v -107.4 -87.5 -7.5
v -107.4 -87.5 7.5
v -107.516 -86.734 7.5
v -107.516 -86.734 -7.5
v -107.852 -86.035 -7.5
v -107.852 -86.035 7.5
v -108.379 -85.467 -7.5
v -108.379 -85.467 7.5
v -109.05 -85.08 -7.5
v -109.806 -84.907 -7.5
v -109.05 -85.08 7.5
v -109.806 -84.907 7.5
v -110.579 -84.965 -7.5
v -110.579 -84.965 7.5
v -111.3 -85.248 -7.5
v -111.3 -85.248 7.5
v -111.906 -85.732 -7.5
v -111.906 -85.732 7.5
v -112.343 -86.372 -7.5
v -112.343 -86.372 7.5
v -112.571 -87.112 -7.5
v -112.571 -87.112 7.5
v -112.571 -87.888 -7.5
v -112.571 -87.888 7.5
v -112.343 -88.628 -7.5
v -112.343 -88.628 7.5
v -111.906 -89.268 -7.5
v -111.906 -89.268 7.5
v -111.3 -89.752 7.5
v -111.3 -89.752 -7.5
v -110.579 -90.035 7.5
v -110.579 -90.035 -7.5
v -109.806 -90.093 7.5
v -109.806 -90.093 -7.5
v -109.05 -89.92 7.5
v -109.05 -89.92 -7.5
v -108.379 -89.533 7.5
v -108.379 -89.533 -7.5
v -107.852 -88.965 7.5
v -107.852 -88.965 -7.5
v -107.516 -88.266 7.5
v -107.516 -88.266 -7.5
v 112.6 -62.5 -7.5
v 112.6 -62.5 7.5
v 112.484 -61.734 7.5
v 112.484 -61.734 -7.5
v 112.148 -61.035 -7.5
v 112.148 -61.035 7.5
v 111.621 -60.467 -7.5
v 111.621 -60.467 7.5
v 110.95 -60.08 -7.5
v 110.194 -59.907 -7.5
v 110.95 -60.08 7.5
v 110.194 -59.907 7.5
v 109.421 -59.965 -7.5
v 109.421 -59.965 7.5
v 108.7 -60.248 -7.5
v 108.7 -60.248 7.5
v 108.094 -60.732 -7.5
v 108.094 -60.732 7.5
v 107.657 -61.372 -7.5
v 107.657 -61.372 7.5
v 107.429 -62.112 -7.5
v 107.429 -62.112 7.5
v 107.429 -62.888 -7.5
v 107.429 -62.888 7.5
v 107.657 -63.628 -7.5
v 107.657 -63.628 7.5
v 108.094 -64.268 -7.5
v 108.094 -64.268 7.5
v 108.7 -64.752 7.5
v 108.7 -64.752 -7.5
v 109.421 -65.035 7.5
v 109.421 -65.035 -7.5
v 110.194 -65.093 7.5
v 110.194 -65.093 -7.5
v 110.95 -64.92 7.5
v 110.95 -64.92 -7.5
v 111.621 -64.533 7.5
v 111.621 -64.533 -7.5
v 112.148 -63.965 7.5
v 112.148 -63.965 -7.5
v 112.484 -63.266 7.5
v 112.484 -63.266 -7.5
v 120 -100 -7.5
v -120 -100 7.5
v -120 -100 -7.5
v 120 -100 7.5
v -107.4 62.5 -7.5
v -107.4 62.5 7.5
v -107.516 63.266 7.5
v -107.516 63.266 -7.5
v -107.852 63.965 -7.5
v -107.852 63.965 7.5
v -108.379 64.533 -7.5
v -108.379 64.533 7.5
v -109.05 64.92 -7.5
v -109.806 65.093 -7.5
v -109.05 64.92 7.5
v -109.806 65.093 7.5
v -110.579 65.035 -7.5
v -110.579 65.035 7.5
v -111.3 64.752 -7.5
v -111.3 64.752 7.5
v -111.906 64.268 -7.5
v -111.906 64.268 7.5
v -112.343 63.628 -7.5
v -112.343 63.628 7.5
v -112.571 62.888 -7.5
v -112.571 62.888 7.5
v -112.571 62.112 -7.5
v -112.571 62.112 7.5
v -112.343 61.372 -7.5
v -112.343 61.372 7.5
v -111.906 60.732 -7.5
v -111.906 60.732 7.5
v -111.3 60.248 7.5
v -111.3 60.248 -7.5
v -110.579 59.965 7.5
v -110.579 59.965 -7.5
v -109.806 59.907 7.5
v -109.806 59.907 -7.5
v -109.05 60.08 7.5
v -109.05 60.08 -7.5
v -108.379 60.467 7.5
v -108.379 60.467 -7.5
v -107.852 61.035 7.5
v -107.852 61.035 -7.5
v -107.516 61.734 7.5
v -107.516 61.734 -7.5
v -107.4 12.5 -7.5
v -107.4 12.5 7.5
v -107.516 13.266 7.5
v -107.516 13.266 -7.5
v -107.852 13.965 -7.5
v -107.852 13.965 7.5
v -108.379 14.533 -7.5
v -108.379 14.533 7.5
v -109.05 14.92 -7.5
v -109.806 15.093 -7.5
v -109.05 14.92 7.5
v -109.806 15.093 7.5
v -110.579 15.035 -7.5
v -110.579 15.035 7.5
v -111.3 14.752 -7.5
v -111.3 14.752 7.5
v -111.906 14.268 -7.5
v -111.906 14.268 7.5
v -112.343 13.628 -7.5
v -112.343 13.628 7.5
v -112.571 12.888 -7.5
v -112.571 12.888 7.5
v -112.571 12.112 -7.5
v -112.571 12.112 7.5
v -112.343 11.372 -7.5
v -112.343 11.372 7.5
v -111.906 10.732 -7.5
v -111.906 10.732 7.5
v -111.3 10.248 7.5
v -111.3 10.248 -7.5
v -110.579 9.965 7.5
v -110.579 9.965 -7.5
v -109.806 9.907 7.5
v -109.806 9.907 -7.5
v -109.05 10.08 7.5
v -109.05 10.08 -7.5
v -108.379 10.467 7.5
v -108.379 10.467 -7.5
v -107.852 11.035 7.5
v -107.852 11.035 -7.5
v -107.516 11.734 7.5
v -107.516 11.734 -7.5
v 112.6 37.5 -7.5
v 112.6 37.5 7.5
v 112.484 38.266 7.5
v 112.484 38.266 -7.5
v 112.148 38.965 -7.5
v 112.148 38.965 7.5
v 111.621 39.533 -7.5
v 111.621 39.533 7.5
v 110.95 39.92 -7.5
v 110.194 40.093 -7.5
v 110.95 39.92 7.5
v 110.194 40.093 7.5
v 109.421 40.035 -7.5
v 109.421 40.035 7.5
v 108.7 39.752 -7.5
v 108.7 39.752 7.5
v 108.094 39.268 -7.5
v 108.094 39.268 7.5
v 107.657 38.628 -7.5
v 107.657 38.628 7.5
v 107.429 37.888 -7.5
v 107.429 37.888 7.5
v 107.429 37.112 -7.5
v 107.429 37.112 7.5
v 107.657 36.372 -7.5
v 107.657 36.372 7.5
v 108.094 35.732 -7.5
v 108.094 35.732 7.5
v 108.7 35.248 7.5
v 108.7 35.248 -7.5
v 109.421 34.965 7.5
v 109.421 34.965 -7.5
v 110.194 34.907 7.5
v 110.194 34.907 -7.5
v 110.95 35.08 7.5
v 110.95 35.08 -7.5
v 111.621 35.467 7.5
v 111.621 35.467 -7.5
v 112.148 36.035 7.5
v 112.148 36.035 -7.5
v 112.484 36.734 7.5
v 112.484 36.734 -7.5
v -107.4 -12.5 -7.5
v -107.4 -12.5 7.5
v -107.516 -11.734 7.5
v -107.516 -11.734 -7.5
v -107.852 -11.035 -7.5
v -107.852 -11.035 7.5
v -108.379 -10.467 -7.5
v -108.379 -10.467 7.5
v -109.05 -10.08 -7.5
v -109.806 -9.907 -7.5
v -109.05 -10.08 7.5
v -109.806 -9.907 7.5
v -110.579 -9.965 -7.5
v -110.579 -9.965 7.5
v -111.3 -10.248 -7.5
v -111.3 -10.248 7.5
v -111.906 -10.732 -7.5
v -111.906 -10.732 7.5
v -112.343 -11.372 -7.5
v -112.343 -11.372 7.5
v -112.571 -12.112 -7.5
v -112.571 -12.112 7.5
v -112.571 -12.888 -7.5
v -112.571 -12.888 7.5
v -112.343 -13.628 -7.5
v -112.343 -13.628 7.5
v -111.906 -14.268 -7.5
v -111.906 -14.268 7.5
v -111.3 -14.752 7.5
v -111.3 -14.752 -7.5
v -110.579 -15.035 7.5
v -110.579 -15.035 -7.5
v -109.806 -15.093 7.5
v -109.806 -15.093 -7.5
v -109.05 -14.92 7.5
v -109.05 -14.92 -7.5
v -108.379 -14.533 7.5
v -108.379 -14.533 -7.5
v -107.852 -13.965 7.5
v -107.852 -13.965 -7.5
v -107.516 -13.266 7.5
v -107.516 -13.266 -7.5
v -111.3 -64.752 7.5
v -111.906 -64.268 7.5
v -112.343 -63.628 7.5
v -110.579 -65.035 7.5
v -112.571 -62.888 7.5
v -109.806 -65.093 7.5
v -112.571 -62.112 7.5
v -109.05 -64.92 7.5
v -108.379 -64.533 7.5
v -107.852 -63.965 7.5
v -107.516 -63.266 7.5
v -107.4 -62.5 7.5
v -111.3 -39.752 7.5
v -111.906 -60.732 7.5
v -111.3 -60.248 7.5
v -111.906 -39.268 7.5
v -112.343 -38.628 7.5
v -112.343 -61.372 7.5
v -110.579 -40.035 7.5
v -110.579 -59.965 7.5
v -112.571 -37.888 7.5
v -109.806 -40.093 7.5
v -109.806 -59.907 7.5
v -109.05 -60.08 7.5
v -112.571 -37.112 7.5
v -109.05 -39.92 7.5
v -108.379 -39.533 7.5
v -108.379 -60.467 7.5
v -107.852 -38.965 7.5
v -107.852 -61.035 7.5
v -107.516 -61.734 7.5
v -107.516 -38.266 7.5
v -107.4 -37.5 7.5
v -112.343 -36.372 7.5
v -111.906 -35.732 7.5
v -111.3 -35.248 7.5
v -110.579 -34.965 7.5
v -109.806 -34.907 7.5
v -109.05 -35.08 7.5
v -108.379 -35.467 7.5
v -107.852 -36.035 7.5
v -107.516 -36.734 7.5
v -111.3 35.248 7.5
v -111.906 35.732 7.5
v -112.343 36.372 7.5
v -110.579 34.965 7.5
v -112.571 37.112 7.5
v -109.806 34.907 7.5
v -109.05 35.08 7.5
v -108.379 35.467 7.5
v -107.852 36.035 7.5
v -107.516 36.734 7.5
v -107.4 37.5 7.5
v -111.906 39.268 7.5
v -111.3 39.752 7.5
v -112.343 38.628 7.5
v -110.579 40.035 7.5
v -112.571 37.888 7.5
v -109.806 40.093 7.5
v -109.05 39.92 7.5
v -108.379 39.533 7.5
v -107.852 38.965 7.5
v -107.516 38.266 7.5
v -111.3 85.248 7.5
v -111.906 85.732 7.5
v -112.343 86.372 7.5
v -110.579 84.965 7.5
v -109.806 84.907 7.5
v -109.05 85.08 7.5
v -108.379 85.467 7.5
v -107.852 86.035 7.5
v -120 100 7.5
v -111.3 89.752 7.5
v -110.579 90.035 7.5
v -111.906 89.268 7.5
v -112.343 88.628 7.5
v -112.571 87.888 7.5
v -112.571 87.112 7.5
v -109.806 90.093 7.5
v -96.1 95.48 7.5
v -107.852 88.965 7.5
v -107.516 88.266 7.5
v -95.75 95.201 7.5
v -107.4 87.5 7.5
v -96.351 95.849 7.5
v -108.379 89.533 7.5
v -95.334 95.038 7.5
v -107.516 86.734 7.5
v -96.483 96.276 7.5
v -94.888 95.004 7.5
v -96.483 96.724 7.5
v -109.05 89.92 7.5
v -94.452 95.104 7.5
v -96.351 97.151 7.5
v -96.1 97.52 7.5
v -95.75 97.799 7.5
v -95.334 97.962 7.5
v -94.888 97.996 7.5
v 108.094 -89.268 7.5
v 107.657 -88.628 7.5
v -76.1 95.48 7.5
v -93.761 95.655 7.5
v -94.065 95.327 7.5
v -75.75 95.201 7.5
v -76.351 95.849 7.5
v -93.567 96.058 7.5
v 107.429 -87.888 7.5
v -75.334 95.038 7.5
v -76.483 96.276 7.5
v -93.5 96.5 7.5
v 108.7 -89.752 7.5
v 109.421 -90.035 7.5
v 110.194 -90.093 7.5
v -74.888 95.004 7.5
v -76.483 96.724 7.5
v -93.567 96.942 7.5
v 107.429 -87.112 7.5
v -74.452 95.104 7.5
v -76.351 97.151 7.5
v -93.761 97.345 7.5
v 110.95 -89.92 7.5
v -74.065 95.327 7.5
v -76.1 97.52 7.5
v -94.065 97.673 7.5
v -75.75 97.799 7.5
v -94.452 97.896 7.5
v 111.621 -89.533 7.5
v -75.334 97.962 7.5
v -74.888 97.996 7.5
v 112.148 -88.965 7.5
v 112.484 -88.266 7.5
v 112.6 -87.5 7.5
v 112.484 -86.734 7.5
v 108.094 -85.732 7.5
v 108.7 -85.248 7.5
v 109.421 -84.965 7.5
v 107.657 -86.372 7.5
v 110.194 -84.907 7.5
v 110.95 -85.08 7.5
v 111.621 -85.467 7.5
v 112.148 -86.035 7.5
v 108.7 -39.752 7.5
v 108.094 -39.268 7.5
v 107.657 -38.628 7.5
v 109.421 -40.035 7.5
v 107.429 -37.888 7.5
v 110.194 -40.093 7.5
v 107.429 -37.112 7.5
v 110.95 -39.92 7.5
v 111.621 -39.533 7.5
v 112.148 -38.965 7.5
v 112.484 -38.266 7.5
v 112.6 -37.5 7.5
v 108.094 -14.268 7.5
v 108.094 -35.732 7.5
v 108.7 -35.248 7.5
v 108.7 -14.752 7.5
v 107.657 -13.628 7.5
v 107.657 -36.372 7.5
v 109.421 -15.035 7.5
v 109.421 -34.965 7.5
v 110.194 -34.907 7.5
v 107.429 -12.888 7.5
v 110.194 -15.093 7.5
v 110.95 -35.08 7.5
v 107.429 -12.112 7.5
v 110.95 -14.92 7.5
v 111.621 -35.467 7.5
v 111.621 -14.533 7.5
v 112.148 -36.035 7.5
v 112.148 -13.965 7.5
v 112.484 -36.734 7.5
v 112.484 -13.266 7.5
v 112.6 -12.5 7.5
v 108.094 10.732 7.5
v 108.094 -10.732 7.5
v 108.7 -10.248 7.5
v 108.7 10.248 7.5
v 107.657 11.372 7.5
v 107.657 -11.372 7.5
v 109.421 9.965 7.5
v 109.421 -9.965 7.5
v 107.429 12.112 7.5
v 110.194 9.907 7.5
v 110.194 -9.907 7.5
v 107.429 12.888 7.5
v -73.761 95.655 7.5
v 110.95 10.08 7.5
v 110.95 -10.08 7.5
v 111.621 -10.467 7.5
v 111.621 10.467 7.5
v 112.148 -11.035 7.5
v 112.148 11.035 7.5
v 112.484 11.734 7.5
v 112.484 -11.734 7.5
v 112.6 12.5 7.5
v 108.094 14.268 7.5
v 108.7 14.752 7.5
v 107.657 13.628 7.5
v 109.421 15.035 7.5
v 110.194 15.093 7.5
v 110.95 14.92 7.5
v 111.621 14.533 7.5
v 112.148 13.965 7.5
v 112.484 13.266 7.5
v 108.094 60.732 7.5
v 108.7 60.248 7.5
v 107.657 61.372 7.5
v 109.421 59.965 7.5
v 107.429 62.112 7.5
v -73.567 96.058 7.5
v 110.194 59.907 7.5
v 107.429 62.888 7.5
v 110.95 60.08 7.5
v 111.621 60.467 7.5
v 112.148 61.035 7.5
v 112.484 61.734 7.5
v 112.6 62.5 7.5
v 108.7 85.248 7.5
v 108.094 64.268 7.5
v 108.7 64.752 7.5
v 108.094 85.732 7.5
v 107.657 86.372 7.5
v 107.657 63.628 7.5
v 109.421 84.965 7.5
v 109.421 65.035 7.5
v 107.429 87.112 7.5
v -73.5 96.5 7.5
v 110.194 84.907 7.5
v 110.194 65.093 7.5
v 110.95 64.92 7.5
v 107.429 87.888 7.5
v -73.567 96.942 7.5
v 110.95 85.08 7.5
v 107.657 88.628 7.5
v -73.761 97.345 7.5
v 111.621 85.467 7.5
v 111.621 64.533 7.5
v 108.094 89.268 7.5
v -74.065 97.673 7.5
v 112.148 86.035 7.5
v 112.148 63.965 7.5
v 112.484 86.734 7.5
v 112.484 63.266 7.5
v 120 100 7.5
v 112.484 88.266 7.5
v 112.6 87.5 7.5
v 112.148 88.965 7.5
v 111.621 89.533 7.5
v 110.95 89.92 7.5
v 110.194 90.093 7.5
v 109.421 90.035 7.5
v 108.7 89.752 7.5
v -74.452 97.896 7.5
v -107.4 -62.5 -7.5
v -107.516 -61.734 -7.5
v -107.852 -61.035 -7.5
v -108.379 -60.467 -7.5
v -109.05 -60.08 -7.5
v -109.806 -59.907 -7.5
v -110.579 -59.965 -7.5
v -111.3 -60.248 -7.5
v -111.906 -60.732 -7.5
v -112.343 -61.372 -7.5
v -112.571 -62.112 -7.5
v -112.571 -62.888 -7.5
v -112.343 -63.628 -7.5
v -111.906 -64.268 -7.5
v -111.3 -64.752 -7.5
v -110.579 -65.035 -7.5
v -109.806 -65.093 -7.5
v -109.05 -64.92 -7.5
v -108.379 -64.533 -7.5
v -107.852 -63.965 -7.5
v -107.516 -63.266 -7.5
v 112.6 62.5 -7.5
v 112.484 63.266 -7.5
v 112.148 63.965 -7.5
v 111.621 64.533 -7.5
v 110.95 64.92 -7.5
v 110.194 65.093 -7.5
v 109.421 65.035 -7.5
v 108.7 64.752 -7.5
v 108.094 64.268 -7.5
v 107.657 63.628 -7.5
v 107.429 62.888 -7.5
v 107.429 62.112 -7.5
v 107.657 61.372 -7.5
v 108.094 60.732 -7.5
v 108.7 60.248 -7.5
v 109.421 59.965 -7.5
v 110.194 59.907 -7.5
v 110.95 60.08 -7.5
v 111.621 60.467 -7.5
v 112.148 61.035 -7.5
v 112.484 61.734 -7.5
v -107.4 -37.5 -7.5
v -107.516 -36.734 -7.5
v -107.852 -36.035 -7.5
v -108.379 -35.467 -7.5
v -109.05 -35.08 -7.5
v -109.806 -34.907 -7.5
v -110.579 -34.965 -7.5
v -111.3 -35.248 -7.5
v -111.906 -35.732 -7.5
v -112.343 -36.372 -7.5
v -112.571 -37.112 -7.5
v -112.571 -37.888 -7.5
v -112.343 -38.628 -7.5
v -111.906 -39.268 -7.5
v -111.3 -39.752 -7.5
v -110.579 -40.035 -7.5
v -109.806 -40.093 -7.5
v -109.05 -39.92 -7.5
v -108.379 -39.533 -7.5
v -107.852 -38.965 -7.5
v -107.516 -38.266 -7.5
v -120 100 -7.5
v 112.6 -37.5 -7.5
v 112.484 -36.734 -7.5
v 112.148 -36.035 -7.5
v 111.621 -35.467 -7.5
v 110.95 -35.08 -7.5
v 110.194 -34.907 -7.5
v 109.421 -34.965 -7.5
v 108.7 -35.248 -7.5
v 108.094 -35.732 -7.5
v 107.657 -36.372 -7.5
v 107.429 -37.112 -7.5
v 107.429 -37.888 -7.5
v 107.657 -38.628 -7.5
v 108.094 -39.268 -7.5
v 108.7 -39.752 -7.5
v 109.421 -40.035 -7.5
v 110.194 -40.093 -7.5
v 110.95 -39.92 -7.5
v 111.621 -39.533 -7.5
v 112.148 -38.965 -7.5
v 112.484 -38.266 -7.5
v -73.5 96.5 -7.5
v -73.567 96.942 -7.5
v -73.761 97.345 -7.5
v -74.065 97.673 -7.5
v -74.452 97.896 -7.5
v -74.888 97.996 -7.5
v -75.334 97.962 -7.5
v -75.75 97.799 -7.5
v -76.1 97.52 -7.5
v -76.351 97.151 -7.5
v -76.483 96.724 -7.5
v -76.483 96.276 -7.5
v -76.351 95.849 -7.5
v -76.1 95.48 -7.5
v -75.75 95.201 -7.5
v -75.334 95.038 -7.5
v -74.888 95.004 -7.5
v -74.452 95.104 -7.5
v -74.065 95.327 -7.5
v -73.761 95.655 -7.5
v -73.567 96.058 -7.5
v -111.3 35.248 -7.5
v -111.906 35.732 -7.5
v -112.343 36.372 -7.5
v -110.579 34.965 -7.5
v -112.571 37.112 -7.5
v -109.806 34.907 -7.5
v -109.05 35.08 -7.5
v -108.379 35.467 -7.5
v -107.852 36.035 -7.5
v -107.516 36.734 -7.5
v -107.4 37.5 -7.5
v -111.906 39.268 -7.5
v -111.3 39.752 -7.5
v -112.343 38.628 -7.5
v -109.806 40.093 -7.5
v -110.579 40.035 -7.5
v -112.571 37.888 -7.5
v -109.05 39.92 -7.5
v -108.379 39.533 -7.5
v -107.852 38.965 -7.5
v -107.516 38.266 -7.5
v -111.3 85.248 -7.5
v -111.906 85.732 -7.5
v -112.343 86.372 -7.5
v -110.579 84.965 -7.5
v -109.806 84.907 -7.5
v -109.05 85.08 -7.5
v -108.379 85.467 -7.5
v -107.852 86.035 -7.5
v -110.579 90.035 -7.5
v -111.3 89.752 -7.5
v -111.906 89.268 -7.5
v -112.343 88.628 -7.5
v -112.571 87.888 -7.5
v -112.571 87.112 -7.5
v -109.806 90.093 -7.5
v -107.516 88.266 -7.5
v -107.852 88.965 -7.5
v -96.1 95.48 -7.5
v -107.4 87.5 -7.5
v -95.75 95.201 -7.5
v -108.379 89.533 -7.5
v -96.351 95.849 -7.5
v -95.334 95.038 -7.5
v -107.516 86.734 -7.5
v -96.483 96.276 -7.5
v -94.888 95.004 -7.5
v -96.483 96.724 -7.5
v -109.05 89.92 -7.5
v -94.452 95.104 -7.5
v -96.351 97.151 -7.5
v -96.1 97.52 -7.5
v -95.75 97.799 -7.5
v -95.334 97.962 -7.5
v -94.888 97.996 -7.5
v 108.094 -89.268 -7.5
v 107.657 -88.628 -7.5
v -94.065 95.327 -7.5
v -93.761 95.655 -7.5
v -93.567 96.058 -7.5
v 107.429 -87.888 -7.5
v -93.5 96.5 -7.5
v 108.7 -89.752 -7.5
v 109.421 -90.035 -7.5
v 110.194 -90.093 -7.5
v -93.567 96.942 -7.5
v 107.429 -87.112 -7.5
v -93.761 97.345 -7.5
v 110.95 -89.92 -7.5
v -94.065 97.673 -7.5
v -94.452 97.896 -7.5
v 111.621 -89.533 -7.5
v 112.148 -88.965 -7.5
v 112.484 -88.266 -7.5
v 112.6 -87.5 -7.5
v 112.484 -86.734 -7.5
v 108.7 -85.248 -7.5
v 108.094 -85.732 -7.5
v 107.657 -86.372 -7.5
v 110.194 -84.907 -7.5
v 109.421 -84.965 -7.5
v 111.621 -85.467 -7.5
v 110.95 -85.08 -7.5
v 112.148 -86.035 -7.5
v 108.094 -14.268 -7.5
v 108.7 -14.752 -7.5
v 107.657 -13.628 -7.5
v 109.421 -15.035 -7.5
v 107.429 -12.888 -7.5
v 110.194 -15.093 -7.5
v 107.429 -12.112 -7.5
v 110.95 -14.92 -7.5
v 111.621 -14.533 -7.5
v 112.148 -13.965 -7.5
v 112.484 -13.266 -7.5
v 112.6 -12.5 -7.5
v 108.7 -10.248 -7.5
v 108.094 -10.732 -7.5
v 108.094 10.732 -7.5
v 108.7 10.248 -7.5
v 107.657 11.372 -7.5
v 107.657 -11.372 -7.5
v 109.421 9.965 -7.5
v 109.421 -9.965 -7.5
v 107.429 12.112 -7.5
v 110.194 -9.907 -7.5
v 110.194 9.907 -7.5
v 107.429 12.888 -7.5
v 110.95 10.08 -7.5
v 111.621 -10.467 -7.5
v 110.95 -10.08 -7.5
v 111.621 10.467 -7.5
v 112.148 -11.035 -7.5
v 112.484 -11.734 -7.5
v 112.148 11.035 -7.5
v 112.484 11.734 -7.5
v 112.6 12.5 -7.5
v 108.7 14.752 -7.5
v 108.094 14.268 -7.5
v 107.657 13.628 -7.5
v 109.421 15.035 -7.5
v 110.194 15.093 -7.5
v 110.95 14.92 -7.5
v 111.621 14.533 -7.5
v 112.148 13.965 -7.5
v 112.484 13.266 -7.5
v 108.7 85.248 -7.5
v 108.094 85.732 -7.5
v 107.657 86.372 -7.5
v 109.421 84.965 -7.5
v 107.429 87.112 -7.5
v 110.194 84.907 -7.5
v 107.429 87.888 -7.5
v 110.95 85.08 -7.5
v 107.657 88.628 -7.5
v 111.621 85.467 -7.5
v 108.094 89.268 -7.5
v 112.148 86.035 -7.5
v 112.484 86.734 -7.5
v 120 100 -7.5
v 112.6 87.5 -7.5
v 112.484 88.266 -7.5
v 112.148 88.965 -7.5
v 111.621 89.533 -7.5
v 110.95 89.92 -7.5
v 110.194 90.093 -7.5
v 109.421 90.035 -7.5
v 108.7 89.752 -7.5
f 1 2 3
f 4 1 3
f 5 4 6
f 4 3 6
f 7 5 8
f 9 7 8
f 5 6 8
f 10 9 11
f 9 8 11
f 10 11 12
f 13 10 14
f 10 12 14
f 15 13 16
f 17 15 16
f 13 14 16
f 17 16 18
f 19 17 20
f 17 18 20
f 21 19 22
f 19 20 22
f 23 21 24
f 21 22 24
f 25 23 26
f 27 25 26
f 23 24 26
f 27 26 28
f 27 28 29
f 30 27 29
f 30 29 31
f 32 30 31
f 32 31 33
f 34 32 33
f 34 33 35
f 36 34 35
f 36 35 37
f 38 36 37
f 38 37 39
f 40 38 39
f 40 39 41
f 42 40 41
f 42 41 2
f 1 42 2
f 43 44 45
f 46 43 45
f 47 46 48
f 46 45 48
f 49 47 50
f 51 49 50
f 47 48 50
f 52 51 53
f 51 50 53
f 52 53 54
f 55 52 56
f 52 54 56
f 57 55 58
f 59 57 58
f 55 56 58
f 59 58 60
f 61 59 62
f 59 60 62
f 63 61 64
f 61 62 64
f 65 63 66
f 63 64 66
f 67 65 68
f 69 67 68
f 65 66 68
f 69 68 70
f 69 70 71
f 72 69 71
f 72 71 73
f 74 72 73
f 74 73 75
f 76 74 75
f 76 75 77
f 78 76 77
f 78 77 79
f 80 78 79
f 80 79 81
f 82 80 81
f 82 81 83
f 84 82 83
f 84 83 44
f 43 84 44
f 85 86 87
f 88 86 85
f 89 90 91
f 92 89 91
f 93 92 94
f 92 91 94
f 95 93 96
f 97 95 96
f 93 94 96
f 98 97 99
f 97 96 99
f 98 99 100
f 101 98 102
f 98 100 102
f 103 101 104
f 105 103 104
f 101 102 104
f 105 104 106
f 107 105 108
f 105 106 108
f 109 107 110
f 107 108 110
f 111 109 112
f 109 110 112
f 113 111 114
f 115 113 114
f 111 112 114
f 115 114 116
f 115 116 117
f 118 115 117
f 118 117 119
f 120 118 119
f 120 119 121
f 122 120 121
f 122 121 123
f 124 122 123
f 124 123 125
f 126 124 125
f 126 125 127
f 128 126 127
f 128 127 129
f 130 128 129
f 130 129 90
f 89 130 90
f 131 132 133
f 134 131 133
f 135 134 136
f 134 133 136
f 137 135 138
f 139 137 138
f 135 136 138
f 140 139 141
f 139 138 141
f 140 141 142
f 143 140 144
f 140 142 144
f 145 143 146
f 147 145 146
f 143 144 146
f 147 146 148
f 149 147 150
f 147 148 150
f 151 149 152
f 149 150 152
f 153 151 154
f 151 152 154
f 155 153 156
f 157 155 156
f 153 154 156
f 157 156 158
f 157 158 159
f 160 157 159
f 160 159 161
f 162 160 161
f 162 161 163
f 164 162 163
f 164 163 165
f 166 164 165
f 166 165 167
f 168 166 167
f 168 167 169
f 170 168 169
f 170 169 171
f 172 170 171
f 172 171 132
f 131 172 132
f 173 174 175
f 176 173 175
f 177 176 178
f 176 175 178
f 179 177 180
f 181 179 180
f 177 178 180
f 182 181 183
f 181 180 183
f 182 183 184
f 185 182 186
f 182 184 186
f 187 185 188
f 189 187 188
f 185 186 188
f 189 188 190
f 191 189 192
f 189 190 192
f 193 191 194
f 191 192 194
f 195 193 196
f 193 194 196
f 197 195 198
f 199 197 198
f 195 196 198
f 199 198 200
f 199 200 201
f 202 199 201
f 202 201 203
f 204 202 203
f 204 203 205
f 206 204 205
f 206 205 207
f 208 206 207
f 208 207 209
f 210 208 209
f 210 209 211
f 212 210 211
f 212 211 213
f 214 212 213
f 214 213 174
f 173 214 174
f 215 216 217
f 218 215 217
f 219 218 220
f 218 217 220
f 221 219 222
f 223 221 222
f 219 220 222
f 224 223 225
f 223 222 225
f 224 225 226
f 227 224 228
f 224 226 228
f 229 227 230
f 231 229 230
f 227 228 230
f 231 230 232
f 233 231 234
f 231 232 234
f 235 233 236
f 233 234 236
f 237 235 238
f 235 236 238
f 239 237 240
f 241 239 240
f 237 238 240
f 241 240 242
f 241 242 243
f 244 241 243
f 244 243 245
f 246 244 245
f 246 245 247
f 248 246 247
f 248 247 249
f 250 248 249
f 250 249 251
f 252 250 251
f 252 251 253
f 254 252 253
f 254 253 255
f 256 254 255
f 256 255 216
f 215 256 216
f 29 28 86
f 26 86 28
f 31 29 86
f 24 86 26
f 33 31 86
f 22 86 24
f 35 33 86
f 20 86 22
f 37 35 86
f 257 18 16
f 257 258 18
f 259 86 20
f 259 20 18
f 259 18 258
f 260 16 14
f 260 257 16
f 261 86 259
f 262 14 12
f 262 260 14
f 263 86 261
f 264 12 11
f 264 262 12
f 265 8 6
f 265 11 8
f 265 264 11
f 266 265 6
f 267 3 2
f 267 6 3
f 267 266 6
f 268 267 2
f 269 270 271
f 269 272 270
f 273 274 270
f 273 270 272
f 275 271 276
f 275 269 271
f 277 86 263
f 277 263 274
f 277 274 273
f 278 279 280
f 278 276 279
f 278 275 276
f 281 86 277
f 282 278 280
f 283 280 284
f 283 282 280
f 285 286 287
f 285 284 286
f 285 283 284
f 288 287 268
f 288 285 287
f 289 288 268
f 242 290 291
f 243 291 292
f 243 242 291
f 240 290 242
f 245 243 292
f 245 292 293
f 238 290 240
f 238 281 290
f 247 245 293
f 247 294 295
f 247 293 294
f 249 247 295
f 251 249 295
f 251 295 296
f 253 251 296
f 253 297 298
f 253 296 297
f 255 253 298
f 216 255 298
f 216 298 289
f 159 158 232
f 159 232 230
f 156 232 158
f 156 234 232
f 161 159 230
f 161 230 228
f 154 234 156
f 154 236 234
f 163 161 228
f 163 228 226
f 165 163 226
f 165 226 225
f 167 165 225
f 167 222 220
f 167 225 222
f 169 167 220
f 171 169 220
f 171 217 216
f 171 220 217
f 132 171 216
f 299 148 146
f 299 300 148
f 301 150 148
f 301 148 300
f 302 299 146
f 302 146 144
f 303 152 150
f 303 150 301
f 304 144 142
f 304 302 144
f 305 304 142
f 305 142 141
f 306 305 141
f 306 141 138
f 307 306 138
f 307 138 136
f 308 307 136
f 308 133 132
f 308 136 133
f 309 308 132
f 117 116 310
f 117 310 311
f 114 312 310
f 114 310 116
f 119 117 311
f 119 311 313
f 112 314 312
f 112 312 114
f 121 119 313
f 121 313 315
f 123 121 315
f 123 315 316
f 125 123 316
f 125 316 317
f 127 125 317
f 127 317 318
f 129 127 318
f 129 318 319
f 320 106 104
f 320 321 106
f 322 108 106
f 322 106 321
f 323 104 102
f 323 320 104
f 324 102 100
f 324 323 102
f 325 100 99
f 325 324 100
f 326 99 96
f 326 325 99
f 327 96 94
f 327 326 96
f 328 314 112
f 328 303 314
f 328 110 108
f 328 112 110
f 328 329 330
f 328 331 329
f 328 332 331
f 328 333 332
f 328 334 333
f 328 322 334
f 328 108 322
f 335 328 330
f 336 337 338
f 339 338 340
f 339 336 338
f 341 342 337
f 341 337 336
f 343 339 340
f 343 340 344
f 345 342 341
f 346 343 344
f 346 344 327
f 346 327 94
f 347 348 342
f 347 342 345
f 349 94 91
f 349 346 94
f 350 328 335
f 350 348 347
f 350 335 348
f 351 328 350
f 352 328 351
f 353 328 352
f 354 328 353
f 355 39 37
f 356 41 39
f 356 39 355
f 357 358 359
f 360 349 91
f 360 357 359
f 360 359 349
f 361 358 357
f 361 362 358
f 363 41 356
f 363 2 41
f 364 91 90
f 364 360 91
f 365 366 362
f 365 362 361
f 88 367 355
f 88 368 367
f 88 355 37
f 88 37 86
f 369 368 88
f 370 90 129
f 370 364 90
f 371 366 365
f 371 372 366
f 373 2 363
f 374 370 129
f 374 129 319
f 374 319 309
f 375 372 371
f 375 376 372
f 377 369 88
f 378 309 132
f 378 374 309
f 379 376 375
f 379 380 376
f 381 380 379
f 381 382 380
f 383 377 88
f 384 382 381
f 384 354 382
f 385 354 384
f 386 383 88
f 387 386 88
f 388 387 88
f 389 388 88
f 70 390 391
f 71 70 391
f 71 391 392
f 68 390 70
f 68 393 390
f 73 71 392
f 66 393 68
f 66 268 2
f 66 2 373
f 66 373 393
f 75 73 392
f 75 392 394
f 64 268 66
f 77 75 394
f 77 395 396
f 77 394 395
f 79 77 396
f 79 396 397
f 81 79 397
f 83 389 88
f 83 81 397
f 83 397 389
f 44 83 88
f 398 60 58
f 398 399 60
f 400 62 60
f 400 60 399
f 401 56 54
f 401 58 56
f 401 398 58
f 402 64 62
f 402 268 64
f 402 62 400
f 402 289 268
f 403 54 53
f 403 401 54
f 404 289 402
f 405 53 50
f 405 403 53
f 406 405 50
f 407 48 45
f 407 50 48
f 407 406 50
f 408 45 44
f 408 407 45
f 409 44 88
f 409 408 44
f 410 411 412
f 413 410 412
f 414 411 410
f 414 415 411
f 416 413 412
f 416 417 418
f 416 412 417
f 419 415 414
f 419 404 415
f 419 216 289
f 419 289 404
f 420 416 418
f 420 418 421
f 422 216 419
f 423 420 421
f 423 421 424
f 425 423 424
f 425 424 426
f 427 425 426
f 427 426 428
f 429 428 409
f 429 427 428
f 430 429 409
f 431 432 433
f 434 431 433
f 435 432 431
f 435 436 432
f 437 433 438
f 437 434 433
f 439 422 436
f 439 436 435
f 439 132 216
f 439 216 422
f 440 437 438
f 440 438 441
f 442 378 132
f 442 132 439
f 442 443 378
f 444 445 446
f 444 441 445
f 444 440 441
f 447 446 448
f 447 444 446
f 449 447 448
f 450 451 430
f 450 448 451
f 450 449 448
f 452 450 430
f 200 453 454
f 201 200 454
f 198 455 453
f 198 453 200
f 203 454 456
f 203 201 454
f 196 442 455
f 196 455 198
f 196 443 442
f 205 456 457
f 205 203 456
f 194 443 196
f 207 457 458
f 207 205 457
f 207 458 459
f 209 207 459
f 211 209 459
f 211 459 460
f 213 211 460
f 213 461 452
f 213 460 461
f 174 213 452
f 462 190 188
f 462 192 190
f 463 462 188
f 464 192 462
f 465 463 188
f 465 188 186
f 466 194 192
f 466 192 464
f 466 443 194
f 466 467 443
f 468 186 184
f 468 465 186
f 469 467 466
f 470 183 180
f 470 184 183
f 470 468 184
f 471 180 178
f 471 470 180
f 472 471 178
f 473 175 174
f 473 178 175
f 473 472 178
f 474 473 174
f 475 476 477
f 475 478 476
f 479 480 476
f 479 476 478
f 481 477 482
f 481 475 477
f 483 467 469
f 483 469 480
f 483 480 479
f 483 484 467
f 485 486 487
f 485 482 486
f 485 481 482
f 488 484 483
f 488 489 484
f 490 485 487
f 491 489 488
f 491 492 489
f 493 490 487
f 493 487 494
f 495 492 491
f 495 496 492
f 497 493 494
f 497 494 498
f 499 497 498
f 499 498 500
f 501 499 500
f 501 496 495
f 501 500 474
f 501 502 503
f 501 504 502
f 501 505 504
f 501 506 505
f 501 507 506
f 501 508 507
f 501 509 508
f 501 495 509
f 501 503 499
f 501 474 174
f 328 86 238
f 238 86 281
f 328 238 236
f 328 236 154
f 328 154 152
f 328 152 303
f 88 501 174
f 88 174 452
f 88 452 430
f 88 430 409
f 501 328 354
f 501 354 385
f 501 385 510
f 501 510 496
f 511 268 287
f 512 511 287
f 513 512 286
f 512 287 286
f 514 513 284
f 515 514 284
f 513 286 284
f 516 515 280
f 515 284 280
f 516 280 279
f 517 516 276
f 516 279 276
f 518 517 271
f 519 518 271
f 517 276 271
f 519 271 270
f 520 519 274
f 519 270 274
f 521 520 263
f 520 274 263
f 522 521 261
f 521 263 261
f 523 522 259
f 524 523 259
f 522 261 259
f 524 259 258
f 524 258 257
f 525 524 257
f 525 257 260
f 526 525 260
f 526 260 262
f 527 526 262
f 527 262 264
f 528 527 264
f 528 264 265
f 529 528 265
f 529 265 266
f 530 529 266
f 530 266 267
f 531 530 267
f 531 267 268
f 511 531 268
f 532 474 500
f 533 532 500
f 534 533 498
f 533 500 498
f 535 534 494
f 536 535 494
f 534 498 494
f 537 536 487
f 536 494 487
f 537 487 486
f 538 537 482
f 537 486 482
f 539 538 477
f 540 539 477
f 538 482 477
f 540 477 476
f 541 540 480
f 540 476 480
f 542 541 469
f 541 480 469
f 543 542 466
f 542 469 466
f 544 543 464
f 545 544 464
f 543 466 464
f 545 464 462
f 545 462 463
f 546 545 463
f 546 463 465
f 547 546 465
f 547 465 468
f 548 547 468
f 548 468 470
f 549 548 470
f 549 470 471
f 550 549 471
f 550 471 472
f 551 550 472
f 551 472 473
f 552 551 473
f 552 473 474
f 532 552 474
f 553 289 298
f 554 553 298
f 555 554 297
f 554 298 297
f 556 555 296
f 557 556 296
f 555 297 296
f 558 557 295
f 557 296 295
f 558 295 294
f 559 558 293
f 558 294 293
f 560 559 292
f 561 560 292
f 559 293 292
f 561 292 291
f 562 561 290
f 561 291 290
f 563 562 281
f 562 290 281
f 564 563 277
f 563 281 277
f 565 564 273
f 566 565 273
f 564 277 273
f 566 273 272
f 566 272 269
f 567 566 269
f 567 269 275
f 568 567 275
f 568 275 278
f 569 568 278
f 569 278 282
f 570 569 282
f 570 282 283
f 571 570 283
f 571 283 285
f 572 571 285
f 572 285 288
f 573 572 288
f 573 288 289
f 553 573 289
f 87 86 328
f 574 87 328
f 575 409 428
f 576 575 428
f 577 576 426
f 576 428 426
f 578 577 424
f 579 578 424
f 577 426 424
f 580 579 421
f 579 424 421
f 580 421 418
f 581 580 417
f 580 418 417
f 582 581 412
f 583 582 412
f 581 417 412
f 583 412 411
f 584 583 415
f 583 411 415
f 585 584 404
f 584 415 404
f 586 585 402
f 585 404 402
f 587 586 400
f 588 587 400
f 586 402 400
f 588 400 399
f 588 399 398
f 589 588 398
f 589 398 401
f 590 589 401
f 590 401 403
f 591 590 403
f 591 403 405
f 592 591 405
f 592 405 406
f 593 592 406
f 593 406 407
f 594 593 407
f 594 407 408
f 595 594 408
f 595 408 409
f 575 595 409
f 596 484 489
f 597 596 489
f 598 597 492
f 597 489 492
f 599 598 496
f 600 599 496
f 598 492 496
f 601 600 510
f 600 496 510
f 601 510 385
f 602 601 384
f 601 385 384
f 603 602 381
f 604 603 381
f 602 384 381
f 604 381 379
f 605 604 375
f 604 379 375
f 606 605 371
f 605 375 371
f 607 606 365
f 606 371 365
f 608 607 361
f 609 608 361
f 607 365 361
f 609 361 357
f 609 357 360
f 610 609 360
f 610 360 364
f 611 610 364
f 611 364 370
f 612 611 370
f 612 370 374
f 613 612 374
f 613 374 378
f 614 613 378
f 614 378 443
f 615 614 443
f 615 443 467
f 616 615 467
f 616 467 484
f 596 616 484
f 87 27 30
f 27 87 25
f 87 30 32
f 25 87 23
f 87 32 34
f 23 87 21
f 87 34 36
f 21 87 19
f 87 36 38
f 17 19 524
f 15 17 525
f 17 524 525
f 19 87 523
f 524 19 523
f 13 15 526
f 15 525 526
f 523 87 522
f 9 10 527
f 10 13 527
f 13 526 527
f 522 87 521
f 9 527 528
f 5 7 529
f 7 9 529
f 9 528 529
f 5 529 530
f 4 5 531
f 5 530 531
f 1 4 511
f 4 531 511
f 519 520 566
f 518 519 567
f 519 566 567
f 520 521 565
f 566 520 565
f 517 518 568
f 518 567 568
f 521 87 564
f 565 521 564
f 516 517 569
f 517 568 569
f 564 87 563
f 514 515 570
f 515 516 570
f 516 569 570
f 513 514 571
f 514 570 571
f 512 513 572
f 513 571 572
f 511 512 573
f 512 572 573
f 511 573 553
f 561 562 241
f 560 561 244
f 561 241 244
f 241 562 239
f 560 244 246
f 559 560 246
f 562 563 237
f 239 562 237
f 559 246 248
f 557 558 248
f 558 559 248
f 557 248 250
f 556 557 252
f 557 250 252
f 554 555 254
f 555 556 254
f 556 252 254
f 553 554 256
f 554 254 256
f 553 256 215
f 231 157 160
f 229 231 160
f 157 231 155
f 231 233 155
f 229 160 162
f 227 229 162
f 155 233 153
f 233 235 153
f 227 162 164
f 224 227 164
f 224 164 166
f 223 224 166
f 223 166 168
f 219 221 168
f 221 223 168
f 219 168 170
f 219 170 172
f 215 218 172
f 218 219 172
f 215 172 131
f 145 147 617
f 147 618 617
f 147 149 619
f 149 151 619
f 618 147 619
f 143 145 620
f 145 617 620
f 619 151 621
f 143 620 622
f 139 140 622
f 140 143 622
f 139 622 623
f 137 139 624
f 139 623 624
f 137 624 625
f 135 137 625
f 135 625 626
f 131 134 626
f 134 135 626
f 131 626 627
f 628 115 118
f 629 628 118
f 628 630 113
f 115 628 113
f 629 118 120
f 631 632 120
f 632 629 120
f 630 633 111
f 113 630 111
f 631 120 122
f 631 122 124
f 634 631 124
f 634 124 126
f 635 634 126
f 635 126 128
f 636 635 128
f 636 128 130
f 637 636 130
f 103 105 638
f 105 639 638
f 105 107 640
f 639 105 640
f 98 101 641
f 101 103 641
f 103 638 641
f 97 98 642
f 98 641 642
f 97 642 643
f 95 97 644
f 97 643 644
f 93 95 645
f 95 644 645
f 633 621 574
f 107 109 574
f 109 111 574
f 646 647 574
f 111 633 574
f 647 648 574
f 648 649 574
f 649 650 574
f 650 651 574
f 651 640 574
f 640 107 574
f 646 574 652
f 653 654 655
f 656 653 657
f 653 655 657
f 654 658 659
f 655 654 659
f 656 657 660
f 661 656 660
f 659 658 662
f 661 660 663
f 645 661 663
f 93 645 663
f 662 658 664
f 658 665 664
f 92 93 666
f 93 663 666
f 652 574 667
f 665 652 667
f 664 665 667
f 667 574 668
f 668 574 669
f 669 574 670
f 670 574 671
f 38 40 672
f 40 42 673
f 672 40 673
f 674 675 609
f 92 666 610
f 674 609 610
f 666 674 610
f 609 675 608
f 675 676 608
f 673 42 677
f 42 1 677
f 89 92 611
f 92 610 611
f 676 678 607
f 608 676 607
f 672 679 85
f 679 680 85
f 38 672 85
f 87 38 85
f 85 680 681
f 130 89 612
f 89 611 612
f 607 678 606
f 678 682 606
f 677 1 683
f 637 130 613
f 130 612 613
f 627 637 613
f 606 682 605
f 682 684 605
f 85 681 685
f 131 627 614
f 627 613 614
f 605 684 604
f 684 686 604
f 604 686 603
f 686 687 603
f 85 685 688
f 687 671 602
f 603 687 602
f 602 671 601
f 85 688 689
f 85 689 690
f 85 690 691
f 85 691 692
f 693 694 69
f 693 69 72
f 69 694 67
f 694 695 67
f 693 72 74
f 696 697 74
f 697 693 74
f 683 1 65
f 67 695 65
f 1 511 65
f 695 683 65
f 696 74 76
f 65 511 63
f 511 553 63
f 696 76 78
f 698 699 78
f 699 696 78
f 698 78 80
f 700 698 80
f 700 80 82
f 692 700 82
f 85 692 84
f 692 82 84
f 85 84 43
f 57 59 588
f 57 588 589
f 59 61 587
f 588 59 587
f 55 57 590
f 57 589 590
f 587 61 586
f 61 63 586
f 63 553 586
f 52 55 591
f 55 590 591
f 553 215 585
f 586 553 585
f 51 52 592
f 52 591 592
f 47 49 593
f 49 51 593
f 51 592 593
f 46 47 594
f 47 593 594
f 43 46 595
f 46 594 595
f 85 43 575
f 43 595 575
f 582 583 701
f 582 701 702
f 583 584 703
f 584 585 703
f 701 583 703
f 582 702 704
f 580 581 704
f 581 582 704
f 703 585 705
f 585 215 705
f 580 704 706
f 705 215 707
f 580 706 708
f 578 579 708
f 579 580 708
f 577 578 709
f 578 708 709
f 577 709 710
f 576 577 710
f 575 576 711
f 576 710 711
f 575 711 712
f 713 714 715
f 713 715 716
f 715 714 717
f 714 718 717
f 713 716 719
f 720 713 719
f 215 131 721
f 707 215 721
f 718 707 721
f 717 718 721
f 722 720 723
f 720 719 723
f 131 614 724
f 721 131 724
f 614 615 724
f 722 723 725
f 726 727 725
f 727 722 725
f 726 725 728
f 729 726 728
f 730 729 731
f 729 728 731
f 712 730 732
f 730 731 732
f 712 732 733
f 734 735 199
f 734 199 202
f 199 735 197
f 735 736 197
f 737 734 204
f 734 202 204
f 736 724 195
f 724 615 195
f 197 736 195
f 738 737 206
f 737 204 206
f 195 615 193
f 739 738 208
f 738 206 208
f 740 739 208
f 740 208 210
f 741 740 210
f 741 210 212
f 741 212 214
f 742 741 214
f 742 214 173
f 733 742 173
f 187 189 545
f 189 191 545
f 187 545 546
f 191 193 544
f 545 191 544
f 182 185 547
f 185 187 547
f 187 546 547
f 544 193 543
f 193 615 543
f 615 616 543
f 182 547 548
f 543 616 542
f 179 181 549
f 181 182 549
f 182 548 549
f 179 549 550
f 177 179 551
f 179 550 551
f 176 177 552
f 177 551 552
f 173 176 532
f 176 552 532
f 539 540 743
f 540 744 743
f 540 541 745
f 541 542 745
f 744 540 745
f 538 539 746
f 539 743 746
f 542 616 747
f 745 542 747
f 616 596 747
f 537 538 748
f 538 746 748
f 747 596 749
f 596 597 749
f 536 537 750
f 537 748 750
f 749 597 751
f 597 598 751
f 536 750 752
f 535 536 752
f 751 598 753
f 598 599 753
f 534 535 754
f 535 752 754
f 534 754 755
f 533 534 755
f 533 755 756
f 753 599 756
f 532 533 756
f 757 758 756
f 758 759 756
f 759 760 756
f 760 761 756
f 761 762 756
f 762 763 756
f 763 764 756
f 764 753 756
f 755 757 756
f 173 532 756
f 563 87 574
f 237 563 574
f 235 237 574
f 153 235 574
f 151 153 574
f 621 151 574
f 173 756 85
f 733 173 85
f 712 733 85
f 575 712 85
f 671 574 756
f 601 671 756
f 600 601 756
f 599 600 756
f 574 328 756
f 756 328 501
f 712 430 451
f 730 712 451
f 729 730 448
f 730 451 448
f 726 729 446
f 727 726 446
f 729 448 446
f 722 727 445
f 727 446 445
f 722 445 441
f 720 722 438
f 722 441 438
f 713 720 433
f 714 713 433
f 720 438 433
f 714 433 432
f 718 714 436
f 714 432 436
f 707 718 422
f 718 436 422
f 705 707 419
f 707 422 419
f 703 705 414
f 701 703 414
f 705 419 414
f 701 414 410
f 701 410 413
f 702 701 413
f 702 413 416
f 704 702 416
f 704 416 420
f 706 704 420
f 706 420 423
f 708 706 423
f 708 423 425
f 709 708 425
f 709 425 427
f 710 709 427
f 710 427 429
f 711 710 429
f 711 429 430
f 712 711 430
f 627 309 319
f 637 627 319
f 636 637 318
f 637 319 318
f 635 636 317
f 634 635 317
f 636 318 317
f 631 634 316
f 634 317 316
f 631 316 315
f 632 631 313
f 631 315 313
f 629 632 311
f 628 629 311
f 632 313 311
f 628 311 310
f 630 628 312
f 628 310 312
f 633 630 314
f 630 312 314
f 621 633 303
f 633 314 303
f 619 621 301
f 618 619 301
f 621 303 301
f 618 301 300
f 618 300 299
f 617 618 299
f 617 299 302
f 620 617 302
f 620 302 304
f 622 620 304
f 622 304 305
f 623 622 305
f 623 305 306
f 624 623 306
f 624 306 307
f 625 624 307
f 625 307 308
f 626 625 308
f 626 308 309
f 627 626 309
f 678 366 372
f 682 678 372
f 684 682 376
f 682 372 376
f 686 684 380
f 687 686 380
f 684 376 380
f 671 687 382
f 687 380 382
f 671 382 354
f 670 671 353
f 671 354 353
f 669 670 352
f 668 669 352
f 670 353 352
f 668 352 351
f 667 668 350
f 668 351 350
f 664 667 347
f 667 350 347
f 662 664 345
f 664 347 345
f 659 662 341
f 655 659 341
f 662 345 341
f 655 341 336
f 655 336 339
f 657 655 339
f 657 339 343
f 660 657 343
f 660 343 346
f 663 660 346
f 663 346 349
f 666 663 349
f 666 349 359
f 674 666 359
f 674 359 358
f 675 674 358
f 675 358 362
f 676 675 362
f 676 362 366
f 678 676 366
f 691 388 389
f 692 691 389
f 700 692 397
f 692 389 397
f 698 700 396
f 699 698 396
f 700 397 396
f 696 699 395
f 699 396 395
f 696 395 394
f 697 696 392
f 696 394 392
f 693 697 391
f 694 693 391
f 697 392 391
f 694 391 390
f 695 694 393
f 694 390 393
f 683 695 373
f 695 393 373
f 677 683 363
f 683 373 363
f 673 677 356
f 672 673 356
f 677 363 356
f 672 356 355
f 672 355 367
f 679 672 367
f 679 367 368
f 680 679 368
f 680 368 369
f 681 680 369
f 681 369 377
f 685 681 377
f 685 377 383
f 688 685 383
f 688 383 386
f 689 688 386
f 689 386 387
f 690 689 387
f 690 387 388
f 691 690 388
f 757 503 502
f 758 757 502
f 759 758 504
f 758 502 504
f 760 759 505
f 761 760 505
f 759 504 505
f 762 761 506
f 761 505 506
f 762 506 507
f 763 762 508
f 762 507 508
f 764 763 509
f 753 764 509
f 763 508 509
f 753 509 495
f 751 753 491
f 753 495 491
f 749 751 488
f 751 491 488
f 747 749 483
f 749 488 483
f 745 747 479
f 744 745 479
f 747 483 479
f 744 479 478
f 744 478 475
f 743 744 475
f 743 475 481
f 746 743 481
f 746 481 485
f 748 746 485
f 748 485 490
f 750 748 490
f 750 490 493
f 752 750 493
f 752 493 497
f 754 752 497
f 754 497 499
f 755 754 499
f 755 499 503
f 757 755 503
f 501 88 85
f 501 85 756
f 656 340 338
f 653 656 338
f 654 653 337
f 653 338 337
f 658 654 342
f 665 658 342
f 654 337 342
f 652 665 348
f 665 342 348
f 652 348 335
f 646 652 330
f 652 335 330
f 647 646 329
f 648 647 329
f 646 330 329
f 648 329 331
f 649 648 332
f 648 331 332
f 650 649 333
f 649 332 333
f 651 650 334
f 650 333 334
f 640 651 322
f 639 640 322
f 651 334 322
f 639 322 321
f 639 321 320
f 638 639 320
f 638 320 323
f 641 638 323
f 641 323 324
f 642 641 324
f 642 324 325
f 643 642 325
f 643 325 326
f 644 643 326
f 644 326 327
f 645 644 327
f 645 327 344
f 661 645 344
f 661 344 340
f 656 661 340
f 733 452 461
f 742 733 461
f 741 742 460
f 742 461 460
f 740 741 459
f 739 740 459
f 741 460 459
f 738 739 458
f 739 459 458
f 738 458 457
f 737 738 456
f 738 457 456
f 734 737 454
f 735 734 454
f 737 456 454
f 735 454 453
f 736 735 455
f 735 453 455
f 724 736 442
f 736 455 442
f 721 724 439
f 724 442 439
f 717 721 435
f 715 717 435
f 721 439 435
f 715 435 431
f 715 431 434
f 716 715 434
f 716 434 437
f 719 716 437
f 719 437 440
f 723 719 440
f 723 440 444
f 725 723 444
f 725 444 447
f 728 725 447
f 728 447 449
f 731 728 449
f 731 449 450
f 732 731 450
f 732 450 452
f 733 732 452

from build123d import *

# Parameters (mm, degrees)
SKETCH1_W           = 240
SKETCH1_H           = 200
BOSS_EXTRUDE1_DEPTH = 7.5
SKETCH4_R           = 2.6
CUT_EXTRUDE3_DEPTH  = 16
LPATTERN1_COUNT     = 8
LPATTERN1_PITCH     = 25
SKETCH5_R           = 1.5
CUT_EXTRUDE4_DEPTH  = 16


with BuildPart() as part:
    # Sketch1 → Boss-Extrude1 (new body, symmetric)
    with BuildSketch(Plane.XY):
        Rectangle(SKETCH1_W, SKETCH1_H)
    extrude(amount=BOSS_EXTRUDE1_DEPTH, both=True)

    # Sketch4 → Cut-Extrude3 (cut, through all)
    with BuildSketch(Plane.XY.offset(7.5)):
        with Locations((-110, 87.5)):
            Circle(SKETCH4_R)
        with Locations((110, 87.5)):
            Circle(SKETCH4_R)
    cut_extrude3 = extrude(amount=-CUT_EXTRUDE3_DEPTH, mode=Mode.SUBTRACT)

    # LPattern1: Cut-Extrude3 ×8
    with Locations(*[(0, -i * LPATTERN1_PITCH, 0) for i in range(1, LPATTERN1_COUNT)]):
        add(cut_extrude3, mode=Mode.SUBTRACT)

    # Sketch5 → Cut-Extrude4 (cut, through all)
    with BuildSketch(Plane.XY.offset(7.5)):
        with Locations((-95, 96.5)):
            Circle(SKETCH5_R)
        with Locations((-75, 96.5)):
            Circle(SKETCH5_R)
    extrude(amount=-CUT_EXTRUDE4_DEPTH, mode=Mode.SUBTRACT)


solid = part.part
